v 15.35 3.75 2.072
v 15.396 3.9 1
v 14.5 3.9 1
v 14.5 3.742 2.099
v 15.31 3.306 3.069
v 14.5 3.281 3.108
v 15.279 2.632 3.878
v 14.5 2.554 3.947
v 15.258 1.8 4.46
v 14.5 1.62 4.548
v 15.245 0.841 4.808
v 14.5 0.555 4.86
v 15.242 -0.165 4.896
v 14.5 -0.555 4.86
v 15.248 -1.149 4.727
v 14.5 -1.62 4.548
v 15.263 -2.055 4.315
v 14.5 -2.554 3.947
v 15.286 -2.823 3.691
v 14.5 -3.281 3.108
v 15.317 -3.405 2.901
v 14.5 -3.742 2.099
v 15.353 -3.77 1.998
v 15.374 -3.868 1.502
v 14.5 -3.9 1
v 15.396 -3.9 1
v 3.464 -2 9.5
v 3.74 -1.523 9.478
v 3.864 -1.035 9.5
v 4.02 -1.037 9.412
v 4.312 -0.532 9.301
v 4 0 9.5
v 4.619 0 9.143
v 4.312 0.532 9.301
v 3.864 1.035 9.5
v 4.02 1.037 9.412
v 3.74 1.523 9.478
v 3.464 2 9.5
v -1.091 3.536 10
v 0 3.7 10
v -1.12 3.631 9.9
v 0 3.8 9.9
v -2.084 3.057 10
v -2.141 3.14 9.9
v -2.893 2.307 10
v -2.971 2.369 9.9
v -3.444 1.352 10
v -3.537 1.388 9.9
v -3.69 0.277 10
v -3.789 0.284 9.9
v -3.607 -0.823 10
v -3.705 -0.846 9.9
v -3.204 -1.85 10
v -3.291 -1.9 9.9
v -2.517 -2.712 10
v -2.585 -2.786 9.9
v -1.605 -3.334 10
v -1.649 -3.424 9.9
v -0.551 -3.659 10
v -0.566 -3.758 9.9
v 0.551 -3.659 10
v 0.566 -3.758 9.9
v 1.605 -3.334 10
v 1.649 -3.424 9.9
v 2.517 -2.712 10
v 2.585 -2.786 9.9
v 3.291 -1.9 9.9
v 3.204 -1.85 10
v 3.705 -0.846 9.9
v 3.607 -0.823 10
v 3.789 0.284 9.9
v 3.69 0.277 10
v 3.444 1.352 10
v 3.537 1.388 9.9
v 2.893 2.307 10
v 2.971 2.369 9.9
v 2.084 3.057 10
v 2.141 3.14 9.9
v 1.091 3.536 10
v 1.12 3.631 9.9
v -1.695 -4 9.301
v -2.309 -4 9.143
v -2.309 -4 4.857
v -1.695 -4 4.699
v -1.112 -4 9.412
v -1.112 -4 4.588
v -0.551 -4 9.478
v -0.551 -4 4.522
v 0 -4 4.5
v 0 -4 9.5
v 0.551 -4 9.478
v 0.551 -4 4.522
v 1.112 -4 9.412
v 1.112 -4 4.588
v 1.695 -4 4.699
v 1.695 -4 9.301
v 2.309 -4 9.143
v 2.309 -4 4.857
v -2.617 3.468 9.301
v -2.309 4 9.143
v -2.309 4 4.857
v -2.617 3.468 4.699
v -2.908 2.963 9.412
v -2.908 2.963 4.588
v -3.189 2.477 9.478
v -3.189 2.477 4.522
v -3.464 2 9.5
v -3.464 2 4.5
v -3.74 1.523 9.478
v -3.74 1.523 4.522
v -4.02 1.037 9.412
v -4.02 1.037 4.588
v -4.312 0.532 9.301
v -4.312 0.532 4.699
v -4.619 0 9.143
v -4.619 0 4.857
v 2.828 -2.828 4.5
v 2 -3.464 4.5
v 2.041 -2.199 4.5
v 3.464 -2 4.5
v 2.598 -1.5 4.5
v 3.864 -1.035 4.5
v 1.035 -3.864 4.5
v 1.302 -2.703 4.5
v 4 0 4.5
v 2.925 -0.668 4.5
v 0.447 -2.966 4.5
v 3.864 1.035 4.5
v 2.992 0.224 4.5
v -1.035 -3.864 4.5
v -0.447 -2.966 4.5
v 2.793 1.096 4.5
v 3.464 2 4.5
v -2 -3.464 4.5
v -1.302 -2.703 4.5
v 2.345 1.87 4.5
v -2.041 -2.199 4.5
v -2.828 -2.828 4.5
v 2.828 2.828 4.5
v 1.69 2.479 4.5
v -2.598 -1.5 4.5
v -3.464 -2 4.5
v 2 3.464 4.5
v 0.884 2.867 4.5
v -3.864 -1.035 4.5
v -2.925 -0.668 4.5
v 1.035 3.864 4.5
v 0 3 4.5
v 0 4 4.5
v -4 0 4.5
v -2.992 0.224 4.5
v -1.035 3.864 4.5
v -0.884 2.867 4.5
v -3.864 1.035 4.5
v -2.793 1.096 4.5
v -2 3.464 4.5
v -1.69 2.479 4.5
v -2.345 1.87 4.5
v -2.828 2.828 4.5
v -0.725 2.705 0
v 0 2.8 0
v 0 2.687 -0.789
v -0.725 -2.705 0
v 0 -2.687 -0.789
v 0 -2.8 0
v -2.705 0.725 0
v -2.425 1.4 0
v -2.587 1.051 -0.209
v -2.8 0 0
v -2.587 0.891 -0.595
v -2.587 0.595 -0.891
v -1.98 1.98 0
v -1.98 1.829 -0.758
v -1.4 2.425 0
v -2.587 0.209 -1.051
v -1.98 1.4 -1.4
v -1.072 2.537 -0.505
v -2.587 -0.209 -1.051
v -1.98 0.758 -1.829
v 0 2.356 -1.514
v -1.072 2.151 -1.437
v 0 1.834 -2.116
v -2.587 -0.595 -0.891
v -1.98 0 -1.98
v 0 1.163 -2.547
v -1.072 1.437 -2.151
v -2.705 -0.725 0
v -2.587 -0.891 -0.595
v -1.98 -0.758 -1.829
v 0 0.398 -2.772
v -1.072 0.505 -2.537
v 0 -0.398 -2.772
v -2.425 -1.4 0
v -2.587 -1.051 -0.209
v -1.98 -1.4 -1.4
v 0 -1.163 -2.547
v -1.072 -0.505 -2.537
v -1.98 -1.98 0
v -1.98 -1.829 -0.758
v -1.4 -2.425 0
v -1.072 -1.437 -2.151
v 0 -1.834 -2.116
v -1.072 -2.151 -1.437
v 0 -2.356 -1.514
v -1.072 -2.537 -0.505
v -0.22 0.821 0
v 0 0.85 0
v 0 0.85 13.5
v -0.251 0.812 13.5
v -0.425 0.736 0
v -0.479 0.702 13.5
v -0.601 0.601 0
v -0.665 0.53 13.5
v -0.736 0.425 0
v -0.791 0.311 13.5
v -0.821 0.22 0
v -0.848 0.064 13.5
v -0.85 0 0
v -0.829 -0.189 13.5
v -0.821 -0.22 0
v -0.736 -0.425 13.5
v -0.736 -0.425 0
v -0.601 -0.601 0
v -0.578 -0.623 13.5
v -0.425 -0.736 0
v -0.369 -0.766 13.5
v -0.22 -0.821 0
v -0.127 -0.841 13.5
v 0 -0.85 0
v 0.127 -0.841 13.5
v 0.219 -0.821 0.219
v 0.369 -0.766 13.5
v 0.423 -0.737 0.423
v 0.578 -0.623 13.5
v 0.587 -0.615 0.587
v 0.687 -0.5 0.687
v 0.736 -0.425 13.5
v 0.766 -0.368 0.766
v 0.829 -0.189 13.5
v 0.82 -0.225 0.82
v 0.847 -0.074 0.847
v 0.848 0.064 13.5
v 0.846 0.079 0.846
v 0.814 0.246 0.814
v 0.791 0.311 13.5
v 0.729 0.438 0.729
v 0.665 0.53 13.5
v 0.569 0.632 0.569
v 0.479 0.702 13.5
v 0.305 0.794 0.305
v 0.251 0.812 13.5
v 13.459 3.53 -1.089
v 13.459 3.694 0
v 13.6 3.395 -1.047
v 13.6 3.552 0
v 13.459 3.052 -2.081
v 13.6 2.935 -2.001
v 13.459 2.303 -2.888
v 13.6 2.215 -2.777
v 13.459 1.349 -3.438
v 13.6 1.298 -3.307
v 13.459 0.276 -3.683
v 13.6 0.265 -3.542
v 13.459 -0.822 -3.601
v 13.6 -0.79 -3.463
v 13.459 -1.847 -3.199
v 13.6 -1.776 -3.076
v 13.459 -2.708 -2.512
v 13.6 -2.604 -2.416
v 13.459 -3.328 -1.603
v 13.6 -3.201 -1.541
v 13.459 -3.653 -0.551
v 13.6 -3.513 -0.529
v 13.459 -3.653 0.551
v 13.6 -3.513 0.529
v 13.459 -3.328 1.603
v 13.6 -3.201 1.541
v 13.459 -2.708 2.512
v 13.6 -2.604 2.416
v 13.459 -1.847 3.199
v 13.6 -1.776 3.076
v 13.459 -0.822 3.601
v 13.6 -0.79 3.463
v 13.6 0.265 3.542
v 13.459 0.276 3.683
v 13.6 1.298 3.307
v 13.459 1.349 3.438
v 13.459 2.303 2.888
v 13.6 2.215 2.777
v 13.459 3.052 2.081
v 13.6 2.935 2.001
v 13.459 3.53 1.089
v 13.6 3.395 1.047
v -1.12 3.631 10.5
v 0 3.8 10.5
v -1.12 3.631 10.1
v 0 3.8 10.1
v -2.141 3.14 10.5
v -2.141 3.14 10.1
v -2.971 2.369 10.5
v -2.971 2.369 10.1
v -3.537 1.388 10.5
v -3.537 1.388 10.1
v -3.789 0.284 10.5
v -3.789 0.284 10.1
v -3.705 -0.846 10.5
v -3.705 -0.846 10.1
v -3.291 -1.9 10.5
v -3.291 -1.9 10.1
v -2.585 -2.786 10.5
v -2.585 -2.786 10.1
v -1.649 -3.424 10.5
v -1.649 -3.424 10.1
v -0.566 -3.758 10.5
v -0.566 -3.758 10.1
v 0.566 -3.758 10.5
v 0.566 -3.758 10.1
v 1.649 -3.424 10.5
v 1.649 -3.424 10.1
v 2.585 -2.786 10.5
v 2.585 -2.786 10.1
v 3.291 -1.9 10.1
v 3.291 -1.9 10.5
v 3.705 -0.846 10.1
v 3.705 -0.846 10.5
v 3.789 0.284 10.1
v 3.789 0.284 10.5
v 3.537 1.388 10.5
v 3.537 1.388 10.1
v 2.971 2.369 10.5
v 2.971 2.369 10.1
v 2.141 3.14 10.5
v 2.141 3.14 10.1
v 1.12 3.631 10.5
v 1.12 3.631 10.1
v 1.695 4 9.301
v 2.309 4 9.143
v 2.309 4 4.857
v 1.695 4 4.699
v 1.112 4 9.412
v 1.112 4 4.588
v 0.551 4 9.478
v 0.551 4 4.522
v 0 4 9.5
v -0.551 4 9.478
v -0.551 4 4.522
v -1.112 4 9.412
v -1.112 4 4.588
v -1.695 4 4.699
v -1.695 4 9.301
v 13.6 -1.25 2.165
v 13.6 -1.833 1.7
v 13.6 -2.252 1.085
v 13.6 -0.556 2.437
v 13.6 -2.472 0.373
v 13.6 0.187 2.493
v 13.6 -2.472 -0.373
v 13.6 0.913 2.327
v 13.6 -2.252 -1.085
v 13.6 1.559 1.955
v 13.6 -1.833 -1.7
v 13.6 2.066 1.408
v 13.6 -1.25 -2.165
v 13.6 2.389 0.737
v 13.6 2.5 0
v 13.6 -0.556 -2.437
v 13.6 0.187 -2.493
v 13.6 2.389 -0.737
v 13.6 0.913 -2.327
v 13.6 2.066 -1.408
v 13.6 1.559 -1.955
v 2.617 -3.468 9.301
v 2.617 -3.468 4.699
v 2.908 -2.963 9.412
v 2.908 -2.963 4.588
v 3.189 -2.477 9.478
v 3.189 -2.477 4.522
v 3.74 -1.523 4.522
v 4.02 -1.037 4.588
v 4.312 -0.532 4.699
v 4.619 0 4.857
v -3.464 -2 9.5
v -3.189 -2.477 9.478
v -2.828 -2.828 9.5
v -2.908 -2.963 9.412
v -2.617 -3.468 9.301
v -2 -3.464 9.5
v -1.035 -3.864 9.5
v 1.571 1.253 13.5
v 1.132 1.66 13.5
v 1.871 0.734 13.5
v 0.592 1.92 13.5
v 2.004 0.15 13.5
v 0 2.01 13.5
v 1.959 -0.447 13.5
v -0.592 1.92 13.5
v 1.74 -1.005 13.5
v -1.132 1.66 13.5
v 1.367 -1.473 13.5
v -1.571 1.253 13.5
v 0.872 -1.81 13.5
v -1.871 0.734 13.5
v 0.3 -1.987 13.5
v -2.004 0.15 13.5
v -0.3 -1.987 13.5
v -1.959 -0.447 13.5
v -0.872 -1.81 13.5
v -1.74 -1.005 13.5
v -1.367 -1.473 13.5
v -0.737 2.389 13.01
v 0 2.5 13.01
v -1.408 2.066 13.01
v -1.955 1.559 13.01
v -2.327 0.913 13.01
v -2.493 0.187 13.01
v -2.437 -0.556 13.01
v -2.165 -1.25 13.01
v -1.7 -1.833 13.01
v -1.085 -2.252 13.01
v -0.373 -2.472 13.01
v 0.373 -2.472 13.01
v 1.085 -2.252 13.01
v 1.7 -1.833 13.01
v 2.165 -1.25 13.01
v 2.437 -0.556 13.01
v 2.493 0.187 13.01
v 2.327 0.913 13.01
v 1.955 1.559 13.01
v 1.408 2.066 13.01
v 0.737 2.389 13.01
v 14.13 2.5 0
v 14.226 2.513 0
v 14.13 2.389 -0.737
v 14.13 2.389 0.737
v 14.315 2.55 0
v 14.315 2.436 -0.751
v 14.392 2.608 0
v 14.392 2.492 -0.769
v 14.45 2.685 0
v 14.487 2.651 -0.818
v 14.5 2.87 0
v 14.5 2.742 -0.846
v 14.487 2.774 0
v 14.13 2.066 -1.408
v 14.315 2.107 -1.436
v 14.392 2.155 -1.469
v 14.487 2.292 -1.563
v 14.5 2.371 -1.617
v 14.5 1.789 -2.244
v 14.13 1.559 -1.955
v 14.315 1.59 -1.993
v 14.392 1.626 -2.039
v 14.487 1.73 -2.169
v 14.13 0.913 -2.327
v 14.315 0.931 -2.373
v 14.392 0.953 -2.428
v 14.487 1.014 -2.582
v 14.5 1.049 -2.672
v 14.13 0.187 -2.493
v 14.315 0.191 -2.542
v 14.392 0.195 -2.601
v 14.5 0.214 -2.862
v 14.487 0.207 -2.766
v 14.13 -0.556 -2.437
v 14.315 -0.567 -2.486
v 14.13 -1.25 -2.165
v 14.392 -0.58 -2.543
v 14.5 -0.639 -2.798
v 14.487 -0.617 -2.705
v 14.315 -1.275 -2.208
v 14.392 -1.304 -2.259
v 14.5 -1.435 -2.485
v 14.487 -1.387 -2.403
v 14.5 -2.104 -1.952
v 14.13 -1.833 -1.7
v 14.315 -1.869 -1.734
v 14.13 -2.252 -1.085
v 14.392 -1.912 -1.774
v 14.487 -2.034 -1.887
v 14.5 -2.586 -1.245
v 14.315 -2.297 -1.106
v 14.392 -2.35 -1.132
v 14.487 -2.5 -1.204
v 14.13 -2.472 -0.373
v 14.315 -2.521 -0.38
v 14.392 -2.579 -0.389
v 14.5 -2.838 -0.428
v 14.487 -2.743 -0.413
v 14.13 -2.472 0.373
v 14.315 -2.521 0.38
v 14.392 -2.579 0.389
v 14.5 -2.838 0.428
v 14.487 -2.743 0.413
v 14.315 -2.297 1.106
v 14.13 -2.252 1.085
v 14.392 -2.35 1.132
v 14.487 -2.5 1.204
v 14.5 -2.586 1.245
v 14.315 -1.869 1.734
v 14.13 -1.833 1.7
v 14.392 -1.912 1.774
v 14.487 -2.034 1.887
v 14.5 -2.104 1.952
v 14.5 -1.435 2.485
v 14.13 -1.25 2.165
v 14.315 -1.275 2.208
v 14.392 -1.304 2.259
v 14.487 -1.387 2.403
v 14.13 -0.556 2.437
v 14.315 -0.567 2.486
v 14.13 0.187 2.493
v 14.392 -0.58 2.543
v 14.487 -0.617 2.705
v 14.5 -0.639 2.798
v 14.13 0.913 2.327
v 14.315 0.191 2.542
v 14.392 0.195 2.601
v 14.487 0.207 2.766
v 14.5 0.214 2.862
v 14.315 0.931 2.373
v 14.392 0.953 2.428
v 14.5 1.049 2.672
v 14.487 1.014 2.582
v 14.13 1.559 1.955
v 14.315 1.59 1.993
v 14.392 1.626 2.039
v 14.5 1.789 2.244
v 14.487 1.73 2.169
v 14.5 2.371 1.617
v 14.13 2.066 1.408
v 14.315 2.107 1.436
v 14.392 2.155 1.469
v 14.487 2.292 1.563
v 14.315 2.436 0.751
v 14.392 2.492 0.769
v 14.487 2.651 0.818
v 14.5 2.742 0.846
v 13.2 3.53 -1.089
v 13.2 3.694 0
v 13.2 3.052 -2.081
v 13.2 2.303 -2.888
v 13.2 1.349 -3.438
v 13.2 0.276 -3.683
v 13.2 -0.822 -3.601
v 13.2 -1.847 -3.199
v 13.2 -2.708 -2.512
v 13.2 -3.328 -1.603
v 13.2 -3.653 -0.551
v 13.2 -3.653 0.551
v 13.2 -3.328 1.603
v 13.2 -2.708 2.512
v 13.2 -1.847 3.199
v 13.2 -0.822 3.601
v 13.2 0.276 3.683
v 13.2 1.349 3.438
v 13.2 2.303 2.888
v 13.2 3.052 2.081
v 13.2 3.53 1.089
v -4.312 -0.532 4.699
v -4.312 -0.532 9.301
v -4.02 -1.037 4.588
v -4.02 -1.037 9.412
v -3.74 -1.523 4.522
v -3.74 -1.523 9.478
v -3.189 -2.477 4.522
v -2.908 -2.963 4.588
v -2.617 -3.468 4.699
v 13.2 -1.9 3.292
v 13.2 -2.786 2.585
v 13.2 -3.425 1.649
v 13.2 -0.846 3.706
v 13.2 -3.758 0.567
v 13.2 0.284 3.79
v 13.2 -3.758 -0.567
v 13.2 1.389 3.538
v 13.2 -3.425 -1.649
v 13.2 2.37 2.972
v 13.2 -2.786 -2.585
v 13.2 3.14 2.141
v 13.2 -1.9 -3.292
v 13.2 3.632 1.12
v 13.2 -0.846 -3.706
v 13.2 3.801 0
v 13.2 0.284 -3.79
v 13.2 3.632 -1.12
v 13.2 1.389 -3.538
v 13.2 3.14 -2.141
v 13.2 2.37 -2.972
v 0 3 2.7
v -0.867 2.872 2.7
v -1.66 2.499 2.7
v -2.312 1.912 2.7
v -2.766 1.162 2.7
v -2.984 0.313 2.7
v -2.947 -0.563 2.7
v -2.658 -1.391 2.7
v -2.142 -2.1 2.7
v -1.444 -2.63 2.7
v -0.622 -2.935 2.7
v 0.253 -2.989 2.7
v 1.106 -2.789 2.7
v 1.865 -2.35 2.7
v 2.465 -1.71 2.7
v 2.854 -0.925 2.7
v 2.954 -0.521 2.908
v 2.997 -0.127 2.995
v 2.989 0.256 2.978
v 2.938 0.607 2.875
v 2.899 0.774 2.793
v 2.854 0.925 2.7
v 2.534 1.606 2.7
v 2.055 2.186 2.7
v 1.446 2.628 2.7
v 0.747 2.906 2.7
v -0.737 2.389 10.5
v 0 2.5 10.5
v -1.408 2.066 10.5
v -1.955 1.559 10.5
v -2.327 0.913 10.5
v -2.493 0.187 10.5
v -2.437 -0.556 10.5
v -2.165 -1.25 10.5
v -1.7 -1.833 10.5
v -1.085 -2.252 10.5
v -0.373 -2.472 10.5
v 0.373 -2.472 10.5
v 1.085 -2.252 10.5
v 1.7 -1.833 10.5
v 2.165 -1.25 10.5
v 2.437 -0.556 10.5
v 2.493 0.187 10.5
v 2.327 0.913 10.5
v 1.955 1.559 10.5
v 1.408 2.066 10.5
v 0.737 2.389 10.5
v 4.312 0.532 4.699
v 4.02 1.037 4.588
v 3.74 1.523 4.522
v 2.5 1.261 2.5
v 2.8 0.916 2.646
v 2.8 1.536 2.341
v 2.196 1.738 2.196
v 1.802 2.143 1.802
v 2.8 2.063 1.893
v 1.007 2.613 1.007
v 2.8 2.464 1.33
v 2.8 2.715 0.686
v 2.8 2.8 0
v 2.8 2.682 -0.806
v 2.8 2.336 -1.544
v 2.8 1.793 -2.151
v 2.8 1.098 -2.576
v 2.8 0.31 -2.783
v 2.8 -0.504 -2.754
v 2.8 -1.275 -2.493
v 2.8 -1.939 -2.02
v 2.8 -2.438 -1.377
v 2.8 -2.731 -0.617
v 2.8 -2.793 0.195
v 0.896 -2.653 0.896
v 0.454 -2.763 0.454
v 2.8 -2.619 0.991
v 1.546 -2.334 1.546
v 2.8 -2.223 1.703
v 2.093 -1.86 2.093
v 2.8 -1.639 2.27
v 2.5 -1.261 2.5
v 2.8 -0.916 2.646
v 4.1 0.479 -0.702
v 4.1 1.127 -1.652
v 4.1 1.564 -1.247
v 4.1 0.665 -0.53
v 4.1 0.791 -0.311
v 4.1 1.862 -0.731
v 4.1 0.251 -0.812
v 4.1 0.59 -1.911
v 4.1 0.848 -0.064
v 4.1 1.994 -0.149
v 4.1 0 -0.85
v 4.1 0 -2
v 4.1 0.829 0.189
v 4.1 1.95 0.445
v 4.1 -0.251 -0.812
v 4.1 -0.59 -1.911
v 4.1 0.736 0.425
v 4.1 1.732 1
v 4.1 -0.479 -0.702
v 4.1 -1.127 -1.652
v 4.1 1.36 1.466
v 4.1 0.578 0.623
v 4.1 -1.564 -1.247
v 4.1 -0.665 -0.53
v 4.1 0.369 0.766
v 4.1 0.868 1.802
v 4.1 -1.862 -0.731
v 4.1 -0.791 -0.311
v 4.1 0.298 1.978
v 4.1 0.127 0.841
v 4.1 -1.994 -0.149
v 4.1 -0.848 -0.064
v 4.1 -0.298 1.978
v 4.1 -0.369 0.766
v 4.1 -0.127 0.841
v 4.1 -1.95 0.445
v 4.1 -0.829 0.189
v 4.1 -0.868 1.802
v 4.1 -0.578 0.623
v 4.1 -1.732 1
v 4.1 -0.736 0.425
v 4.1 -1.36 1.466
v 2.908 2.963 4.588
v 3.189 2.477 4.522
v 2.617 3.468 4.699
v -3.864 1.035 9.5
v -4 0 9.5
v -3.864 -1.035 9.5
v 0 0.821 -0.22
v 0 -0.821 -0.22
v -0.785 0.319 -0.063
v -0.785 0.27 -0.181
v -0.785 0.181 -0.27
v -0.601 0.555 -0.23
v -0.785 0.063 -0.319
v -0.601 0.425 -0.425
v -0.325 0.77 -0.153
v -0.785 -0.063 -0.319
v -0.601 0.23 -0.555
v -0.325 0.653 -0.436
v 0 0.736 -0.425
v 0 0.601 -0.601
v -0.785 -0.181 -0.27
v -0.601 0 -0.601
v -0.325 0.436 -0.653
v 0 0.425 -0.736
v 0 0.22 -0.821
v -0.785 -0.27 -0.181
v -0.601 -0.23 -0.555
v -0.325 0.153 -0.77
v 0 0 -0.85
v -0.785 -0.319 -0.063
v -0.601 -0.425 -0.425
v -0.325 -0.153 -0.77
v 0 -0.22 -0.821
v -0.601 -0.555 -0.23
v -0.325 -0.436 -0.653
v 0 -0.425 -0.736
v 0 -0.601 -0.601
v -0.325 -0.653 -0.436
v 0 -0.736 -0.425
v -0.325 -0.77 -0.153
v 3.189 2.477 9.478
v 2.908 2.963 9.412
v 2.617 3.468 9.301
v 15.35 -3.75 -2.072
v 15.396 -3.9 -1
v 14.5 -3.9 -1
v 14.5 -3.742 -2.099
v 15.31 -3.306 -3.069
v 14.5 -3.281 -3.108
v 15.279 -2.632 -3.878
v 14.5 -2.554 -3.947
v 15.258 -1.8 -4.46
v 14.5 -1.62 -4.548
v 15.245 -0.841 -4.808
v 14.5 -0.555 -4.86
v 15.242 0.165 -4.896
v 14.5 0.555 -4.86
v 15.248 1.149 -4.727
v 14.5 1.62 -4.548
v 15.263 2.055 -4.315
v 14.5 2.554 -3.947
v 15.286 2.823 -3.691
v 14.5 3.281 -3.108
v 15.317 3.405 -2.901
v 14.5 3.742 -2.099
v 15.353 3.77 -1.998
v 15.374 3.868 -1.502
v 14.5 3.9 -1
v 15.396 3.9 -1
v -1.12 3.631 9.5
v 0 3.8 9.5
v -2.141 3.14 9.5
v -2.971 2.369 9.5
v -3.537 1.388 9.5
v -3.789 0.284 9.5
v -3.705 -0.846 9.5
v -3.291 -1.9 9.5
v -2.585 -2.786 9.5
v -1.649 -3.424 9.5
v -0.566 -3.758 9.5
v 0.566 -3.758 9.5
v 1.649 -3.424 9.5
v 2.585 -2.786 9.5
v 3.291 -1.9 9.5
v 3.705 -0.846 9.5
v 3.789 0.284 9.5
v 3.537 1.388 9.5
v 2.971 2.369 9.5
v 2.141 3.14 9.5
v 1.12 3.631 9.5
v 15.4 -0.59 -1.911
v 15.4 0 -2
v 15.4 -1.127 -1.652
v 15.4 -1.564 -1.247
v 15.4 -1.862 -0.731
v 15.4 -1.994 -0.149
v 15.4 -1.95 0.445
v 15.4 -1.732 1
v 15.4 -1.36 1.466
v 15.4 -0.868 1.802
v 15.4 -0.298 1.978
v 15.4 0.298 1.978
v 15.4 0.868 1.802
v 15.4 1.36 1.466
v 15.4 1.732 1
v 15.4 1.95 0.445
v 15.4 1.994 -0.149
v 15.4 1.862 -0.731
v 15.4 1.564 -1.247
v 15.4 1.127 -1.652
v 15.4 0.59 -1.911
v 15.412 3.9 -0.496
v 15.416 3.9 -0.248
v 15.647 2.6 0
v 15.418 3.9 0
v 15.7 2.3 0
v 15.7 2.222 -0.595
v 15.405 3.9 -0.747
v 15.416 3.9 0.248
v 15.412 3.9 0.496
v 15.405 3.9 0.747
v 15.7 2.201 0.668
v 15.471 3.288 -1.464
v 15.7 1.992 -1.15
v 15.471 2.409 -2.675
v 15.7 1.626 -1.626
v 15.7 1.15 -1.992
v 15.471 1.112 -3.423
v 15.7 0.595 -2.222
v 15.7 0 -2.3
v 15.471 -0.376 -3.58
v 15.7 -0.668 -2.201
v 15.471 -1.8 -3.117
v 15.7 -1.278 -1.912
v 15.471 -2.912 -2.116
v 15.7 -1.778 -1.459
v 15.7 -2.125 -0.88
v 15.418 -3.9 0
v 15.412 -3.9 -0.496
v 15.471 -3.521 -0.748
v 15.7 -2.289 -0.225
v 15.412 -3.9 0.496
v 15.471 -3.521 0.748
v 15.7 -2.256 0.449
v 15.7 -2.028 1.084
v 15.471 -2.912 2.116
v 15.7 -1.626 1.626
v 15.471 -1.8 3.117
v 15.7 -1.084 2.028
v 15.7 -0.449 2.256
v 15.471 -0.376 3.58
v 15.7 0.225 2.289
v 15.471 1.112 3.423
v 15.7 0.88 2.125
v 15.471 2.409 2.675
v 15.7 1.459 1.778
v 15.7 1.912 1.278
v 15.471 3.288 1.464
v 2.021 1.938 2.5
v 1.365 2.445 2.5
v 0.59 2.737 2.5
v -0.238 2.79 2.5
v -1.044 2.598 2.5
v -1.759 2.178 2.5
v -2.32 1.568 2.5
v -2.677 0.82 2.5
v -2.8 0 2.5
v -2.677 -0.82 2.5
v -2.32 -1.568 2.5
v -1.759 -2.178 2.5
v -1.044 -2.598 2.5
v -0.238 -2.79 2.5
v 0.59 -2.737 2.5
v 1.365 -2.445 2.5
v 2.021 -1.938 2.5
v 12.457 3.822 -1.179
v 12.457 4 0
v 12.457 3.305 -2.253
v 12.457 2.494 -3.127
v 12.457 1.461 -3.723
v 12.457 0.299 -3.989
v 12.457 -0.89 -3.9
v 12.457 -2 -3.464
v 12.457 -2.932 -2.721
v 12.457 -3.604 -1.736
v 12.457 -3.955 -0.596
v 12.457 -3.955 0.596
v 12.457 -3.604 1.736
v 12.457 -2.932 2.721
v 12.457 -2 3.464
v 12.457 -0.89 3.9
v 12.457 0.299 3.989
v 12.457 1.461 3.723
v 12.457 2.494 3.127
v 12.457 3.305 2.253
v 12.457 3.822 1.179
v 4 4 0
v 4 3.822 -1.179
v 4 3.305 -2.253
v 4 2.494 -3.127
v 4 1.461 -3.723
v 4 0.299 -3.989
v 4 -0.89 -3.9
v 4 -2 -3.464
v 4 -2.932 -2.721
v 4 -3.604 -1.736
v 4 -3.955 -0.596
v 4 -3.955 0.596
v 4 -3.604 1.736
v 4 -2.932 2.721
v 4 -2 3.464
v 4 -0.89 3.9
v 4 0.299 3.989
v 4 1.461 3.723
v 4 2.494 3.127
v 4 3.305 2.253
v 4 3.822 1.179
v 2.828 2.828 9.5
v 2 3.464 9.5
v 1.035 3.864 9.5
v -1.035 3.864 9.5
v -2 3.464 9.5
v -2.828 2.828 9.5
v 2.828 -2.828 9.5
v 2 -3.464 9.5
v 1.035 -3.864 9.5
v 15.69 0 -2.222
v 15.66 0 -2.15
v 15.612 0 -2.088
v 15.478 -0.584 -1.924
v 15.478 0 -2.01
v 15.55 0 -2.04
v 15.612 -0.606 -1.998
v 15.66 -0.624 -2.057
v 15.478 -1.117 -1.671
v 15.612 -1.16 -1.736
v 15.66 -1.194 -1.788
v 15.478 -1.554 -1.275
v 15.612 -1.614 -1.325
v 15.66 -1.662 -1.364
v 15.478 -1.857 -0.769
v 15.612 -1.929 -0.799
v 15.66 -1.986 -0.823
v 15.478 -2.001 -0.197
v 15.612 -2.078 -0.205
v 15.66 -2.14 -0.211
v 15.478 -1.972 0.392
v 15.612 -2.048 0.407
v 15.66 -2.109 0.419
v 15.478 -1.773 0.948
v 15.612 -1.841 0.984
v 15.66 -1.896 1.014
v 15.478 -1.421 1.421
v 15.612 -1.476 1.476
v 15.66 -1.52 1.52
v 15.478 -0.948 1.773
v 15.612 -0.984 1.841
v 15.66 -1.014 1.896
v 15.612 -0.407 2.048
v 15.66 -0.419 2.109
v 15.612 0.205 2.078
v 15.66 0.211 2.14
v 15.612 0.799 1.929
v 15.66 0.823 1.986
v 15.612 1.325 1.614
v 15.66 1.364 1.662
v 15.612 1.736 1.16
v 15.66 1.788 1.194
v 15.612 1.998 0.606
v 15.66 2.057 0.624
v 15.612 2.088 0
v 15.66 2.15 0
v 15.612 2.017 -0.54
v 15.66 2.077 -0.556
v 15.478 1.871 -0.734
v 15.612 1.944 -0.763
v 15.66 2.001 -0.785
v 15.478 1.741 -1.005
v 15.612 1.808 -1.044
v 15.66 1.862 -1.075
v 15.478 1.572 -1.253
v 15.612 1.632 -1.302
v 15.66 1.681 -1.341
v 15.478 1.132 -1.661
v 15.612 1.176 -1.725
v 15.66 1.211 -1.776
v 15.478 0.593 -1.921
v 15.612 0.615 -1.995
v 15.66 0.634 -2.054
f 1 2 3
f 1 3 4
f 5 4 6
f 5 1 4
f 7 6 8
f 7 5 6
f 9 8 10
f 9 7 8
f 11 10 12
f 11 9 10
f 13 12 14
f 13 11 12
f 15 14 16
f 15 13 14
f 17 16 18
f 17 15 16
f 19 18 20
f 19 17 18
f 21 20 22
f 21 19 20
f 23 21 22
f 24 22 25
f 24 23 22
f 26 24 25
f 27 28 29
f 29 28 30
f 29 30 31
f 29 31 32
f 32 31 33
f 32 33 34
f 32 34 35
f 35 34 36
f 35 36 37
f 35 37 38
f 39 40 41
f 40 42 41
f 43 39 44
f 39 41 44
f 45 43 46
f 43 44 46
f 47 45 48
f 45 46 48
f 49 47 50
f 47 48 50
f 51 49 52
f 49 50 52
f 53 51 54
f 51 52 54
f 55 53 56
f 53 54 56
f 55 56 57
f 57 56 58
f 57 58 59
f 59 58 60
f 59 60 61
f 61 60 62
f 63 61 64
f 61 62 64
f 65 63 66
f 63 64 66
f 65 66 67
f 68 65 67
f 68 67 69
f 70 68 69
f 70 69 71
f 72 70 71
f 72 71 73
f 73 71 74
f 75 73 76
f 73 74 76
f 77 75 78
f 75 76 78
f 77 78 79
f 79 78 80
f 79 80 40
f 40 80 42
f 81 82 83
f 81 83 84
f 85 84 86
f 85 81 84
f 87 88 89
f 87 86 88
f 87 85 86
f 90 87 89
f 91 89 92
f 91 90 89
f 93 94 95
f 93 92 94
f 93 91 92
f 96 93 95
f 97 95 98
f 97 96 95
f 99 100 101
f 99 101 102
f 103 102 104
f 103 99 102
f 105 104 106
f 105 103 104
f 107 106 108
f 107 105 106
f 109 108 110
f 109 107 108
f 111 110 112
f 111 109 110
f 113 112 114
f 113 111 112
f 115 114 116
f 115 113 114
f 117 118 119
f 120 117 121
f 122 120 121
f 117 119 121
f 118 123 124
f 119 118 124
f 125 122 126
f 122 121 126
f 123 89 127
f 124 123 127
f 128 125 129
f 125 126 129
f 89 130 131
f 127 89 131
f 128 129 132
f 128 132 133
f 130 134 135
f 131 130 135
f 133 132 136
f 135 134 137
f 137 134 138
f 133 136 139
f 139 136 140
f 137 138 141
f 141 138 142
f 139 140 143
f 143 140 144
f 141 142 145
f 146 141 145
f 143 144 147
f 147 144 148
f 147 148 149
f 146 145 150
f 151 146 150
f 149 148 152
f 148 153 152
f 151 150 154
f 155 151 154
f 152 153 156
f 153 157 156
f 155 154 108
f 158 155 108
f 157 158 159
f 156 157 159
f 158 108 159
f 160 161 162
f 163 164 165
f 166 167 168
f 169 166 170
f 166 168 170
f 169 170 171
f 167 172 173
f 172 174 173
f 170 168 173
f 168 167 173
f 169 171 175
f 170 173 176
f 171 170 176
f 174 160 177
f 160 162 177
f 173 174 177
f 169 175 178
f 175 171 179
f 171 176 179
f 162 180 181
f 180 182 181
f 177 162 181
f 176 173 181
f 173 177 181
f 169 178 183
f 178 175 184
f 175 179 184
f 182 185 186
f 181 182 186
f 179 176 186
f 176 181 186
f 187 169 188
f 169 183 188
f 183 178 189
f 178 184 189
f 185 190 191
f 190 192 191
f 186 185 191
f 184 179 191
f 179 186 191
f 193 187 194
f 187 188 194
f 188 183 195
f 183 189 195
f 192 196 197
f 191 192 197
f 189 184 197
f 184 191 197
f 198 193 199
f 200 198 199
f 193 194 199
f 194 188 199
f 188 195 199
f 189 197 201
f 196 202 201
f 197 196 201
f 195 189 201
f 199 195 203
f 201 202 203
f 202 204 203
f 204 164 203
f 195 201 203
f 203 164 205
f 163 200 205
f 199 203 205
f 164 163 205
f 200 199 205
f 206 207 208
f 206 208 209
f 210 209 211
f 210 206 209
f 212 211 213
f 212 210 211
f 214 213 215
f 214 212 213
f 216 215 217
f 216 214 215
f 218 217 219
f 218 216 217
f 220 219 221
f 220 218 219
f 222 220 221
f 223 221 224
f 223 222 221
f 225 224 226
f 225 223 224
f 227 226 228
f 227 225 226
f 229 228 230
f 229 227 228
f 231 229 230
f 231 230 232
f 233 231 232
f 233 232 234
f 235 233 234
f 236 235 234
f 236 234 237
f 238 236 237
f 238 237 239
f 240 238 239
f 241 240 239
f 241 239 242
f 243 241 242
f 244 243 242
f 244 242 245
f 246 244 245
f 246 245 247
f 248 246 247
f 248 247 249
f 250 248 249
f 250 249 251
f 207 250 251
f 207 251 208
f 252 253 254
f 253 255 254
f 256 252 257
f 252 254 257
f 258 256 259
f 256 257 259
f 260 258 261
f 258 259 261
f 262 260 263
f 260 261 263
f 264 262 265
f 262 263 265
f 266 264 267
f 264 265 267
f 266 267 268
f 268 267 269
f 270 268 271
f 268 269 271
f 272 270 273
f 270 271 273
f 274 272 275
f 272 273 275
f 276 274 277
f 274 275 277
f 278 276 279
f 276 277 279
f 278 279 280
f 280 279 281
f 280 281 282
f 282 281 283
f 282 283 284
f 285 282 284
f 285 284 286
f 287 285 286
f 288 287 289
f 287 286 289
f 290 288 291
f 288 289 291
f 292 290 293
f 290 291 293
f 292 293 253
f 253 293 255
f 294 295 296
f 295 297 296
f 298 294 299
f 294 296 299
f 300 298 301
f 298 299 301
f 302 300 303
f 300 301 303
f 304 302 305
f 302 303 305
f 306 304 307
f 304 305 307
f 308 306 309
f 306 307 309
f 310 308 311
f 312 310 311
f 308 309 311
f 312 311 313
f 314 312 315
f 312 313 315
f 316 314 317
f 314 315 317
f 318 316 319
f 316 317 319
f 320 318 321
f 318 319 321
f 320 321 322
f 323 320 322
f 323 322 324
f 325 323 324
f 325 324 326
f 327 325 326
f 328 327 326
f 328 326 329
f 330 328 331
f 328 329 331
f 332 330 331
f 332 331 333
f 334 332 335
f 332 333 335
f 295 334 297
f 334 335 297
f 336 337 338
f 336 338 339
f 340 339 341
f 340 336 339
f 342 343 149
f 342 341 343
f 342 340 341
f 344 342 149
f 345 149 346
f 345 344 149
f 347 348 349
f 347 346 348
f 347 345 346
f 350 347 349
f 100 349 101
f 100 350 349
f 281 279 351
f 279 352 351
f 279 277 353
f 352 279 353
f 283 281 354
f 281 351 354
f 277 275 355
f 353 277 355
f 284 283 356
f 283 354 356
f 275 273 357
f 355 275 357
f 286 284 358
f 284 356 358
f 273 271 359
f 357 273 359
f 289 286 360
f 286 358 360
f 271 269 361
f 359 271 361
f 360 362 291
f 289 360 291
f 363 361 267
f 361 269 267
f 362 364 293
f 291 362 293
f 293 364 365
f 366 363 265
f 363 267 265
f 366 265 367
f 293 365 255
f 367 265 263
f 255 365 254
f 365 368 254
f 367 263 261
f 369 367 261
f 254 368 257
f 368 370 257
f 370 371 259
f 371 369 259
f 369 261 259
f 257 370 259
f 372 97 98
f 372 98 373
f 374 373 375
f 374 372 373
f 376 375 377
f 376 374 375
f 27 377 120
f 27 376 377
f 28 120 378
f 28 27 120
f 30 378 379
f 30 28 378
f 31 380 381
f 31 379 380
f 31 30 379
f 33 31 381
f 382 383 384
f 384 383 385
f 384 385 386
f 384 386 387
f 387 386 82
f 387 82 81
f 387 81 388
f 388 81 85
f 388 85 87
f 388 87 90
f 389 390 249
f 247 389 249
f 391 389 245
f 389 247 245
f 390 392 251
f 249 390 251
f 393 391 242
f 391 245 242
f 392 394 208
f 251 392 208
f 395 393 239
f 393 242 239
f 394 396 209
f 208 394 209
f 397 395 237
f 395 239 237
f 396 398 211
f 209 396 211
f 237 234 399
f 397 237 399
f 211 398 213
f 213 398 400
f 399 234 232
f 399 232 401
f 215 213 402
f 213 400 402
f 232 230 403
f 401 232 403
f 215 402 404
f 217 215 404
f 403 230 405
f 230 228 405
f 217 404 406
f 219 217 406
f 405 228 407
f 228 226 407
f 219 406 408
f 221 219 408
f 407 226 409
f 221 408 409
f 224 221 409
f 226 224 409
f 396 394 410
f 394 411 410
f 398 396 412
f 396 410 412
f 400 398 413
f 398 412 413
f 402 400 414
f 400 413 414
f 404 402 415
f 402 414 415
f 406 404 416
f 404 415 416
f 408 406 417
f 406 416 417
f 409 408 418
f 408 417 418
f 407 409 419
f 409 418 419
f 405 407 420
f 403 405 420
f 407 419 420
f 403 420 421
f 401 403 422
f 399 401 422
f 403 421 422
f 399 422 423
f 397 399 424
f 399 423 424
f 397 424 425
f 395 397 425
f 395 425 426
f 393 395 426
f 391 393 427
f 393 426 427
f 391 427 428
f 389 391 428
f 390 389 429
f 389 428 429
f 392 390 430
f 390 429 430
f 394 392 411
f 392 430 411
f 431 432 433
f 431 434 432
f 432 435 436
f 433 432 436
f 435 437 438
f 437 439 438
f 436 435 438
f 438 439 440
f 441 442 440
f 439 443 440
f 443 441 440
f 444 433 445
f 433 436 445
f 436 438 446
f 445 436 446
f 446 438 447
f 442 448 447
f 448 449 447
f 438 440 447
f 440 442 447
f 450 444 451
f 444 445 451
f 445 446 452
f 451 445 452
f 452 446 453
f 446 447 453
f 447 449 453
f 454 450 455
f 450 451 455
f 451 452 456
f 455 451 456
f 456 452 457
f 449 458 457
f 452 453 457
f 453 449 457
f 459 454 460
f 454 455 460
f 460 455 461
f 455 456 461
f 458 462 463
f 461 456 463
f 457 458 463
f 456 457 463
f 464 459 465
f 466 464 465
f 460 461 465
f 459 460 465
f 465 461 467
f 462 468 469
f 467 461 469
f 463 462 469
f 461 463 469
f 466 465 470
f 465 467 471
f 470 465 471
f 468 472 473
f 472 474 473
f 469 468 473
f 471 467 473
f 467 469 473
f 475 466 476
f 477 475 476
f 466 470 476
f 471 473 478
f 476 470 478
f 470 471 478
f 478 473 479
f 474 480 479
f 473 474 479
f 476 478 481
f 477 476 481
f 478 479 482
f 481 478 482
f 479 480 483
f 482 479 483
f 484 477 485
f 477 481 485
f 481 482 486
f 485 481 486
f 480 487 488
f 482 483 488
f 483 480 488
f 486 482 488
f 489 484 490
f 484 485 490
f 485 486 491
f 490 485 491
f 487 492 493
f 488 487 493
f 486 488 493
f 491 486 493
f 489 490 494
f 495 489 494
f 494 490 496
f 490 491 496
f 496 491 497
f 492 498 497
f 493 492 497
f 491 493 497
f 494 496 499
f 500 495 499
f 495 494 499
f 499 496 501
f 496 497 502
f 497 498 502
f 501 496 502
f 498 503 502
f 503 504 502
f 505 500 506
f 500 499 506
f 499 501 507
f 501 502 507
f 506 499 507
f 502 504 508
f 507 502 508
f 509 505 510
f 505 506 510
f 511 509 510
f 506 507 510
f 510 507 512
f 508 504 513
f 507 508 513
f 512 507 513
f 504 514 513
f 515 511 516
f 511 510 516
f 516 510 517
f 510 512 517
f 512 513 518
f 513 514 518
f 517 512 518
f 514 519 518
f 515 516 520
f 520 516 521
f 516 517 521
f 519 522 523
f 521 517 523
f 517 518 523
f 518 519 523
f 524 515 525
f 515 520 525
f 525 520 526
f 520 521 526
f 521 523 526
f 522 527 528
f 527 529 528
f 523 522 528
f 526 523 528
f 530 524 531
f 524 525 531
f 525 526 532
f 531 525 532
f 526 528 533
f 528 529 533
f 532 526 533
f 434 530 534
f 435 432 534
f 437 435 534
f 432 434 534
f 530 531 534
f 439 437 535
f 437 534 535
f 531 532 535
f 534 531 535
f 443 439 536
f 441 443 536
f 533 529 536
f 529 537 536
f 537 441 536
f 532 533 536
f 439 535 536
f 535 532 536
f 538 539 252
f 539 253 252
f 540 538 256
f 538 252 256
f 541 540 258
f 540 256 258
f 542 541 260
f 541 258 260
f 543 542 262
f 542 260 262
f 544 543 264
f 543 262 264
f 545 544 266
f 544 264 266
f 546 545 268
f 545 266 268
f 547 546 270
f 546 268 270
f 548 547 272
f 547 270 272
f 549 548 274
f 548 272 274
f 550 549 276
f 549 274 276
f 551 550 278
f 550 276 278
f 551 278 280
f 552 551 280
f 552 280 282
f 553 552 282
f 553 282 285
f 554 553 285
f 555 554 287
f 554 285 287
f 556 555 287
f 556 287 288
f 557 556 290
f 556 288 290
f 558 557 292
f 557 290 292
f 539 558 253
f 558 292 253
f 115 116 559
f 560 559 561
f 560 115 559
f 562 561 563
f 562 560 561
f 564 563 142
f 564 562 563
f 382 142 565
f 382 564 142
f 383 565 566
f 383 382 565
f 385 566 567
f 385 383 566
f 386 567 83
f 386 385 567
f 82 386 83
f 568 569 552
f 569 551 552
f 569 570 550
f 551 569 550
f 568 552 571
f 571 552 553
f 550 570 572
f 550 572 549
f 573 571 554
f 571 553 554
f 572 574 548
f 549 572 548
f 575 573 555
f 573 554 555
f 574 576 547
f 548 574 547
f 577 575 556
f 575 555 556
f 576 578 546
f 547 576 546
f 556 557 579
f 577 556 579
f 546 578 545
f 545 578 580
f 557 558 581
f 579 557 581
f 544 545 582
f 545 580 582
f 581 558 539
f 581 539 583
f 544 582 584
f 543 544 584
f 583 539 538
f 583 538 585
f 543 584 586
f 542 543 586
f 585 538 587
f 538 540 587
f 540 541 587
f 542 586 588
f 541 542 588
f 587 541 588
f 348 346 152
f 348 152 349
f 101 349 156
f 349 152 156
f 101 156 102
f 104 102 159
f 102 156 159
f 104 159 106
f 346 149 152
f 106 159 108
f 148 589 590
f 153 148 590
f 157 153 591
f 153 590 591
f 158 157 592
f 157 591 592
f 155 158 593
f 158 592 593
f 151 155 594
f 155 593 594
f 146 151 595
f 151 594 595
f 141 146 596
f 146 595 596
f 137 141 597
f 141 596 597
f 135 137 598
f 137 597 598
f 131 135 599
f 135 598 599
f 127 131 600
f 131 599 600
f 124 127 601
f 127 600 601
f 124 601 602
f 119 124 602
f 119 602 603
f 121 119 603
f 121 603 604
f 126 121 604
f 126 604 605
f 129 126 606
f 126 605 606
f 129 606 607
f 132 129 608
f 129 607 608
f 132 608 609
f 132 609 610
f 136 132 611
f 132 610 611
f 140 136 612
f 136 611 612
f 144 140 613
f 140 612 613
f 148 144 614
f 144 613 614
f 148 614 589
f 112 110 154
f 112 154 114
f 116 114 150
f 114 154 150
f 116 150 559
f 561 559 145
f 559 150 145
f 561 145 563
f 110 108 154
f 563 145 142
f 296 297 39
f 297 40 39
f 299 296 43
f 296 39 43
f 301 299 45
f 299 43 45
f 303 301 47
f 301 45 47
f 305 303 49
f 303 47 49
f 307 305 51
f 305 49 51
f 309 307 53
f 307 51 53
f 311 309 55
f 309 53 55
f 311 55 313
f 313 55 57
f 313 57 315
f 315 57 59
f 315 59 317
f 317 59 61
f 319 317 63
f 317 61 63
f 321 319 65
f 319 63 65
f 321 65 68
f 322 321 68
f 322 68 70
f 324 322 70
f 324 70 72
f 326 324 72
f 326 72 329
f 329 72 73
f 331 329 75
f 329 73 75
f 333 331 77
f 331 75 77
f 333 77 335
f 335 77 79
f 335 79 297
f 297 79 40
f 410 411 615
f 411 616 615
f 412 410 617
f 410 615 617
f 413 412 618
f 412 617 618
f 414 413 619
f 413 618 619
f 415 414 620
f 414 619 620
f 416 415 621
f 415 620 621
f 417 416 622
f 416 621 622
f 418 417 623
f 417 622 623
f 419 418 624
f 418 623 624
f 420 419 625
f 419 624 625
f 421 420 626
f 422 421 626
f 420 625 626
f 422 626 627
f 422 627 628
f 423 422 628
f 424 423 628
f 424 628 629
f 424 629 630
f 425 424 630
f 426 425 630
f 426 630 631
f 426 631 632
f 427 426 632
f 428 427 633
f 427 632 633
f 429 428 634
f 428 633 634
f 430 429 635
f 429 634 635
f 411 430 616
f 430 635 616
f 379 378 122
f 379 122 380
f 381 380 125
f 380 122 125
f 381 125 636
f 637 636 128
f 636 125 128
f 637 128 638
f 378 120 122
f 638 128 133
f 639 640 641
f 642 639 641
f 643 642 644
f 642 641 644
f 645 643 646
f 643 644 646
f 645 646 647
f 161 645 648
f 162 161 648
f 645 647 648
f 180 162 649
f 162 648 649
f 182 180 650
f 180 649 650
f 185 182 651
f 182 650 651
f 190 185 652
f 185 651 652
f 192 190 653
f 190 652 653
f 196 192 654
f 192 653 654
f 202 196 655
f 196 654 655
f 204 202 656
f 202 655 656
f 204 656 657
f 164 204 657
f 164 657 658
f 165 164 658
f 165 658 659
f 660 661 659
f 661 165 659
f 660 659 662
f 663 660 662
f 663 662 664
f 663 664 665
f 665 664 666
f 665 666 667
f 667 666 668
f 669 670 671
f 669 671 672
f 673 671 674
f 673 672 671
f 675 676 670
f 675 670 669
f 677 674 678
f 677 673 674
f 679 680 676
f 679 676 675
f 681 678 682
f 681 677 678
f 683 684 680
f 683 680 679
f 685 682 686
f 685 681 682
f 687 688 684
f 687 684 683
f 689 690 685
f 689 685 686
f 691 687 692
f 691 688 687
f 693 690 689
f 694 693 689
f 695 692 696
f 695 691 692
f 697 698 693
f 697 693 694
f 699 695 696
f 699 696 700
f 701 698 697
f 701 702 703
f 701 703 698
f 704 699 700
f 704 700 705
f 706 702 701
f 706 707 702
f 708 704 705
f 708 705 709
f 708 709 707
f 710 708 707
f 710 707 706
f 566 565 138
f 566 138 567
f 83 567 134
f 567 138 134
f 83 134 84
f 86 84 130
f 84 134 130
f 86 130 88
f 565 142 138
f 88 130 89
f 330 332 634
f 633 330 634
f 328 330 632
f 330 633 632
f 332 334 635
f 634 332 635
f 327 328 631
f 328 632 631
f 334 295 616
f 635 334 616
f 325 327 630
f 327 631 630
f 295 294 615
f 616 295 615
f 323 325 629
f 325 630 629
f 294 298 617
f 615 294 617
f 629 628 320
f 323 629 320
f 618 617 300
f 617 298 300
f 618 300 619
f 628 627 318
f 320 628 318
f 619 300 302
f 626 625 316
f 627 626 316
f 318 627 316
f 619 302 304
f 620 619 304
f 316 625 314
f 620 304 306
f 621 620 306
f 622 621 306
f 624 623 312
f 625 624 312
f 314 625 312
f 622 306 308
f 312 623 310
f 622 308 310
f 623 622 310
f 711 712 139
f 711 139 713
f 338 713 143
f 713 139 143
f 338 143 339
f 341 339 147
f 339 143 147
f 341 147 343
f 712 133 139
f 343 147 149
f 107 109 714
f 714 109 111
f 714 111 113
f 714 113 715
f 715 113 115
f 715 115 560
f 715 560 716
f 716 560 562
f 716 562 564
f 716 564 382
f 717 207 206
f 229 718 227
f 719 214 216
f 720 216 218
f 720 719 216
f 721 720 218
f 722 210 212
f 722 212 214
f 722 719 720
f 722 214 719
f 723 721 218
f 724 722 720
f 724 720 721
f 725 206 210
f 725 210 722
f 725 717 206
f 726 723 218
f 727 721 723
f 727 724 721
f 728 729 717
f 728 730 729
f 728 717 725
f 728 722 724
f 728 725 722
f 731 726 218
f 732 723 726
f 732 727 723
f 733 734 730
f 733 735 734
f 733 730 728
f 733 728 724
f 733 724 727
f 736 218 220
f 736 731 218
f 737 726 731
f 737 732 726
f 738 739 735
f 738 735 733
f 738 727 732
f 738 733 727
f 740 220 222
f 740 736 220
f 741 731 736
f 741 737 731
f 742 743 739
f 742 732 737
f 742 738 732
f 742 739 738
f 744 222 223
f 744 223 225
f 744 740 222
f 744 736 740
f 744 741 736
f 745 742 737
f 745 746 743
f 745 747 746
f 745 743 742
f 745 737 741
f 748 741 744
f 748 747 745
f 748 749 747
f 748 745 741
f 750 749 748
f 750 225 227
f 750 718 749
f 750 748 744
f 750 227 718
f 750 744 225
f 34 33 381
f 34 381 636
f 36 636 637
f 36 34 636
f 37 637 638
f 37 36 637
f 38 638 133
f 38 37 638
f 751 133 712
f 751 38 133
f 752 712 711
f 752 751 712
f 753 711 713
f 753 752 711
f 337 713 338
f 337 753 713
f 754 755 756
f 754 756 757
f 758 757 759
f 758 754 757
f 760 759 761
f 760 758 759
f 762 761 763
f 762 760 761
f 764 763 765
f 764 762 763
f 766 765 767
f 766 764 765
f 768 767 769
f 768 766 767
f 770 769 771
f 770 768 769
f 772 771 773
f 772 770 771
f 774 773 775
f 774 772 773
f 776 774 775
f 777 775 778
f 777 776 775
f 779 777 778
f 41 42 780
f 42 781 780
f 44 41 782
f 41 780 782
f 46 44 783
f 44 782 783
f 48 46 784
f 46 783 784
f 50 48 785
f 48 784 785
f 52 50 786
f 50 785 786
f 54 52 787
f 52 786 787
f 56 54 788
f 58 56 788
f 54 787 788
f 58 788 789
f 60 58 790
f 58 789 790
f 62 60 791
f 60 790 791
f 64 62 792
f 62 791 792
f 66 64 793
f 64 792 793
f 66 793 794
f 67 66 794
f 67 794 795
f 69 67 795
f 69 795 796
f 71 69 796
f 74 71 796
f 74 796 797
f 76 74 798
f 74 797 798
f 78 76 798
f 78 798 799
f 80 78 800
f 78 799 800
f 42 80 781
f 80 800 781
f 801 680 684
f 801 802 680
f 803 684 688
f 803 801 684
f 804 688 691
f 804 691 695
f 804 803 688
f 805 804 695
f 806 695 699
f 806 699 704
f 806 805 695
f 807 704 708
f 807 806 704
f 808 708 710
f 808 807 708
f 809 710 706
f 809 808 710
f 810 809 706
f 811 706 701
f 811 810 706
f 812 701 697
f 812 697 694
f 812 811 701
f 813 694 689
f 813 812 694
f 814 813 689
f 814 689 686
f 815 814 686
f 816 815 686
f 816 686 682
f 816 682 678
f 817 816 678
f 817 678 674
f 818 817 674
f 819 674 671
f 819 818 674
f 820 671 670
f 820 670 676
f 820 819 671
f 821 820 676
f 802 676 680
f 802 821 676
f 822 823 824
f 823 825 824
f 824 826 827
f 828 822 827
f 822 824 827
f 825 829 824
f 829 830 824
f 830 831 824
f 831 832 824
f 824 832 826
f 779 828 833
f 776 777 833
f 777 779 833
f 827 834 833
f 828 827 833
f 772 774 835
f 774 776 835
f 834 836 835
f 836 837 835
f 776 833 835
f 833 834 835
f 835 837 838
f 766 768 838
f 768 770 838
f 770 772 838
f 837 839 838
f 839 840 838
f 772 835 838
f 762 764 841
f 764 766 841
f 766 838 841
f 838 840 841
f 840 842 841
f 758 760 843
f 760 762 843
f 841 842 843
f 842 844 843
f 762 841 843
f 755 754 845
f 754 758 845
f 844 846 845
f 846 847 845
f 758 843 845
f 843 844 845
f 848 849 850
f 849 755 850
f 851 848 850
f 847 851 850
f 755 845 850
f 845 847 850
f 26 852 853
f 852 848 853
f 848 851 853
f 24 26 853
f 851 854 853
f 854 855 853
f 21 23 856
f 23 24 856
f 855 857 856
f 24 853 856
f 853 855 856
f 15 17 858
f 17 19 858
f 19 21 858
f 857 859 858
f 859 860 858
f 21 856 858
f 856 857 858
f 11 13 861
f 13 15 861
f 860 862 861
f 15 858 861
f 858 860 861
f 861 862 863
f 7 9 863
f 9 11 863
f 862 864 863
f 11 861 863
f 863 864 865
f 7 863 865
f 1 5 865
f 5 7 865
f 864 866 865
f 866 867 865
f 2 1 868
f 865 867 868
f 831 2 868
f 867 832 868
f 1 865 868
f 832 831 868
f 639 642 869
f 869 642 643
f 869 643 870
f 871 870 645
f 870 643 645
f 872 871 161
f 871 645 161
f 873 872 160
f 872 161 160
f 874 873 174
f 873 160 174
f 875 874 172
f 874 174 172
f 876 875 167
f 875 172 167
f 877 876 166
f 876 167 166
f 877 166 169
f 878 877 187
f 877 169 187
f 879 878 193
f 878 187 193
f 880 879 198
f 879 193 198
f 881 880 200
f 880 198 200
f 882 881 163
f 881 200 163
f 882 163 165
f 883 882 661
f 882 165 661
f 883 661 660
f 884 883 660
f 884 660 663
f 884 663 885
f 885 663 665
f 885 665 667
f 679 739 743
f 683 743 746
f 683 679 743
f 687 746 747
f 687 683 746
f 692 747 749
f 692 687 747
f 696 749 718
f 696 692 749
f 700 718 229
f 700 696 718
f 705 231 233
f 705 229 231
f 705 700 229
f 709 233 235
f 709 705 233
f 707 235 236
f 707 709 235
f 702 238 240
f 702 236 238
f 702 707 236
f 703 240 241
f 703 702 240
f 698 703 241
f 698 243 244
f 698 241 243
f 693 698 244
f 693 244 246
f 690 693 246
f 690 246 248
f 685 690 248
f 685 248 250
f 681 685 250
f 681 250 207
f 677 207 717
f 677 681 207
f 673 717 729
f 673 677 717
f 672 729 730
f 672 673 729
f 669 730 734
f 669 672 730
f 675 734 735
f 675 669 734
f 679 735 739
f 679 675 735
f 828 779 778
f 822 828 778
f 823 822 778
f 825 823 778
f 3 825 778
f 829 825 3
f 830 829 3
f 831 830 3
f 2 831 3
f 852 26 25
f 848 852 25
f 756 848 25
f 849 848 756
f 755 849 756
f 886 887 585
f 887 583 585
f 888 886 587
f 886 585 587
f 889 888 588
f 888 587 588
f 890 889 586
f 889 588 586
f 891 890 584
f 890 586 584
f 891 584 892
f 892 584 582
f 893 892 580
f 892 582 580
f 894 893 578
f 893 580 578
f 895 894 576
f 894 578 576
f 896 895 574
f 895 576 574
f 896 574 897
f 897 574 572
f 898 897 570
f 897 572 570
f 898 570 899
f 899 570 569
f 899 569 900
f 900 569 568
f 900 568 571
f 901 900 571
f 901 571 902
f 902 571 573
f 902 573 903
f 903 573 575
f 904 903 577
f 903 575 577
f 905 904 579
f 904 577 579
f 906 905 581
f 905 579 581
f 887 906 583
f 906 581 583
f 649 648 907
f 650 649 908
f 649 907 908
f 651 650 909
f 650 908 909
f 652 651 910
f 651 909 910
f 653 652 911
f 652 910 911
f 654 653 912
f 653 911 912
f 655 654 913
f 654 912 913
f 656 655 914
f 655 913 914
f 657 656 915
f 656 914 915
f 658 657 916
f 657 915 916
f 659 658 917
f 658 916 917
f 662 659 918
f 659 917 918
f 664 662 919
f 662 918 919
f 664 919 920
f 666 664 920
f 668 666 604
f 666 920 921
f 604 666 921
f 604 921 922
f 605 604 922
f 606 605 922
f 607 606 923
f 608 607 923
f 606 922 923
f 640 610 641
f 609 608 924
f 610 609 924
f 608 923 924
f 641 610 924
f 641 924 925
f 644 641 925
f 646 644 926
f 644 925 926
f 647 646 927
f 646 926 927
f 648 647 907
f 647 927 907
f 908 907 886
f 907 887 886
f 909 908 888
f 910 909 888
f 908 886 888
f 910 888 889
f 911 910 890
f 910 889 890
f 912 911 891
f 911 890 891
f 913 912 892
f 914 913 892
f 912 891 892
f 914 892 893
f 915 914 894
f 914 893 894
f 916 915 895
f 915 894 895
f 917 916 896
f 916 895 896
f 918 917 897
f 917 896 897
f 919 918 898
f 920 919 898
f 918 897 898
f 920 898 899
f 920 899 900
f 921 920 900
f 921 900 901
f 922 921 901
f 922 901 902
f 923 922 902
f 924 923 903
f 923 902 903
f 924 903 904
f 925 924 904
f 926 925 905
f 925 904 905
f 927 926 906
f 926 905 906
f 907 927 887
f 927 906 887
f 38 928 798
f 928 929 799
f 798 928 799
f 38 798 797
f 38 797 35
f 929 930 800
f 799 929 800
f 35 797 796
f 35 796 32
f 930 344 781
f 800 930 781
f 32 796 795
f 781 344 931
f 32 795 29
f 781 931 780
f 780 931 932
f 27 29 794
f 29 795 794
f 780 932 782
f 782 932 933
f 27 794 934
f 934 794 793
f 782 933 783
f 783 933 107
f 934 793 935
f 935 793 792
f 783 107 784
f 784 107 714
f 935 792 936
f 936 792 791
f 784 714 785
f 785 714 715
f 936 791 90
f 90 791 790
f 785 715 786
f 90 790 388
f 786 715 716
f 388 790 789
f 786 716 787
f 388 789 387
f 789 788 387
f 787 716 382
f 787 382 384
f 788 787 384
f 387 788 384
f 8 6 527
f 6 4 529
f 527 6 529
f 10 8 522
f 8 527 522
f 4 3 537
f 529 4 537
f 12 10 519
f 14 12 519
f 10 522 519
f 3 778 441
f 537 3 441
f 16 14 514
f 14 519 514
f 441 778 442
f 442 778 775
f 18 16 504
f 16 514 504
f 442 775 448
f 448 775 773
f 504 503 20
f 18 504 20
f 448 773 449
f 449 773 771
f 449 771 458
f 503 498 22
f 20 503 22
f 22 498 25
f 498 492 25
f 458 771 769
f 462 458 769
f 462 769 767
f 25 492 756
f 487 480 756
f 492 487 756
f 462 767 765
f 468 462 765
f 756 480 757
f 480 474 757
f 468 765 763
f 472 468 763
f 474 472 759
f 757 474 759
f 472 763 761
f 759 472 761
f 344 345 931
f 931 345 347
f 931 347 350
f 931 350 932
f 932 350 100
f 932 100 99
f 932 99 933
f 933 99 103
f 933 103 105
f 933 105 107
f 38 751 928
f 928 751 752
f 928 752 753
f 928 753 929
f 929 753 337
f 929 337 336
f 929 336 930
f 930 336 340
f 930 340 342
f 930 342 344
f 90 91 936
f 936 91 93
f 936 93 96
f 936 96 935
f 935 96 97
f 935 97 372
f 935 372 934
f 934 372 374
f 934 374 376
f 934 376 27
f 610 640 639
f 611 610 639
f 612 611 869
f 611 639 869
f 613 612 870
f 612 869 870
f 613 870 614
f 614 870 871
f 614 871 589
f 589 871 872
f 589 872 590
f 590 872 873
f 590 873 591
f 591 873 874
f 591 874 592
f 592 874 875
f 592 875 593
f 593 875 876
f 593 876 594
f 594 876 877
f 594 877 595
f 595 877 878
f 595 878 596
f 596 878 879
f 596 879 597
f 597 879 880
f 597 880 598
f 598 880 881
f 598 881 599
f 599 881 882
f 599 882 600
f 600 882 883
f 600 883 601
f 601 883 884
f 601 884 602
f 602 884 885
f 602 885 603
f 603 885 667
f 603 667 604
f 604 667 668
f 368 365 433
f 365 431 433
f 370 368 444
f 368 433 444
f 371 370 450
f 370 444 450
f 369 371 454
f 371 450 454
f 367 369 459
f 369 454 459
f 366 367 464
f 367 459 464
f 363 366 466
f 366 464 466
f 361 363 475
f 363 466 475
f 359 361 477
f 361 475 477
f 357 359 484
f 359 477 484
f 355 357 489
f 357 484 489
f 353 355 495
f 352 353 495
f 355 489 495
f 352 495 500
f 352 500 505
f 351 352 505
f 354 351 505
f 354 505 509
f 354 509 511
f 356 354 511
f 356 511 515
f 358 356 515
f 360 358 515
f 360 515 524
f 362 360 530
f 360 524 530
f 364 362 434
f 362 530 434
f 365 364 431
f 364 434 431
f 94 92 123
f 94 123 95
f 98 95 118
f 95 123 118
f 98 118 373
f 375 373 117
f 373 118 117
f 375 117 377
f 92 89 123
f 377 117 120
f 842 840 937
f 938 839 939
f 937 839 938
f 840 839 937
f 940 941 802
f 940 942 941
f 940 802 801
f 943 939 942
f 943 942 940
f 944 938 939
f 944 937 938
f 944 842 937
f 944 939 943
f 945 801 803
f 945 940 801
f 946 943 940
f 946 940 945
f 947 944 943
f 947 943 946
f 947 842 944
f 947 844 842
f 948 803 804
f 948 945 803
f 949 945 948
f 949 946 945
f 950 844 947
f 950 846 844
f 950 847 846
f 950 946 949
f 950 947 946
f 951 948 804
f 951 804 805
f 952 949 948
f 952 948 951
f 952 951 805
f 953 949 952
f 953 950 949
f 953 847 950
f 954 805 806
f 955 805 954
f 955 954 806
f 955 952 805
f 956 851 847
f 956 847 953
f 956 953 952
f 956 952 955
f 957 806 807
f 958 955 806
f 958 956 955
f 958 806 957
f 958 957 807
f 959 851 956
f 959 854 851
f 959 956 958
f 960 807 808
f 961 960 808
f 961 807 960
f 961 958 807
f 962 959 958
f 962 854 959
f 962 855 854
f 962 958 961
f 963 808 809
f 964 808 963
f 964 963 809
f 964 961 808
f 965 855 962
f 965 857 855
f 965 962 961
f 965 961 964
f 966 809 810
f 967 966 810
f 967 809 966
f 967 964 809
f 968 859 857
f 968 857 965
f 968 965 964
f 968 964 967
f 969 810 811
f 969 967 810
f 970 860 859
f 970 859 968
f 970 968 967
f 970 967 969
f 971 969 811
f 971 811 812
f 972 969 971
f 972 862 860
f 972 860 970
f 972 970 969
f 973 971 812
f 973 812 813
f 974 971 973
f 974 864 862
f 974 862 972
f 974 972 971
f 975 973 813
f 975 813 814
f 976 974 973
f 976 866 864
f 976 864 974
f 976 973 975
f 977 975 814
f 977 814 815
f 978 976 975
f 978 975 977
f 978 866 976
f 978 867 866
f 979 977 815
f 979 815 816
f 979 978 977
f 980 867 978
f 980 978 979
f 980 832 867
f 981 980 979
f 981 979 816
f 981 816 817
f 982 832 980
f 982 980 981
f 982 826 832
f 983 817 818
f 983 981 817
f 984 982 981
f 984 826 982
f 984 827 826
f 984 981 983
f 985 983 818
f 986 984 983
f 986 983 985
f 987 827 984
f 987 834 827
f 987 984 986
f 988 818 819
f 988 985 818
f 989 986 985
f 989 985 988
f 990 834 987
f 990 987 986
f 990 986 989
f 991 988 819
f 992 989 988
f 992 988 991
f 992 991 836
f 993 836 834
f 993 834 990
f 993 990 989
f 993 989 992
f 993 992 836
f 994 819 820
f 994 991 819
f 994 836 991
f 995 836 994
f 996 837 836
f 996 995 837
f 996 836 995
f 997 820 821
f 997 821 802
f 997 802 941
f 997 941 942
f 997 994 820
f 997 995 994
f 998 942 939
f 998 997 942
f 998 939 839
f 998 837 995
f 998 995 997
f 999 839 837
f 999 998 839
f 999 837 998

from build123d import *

# Parameters (mm, degrees)
CUT_EXTRUDE1_DEPTH = 1.2
SKETCH6_W          = 13.5
SKETCH6_H          = 0.85
SKETCH7_W          = 16
SKETCH7_H          = 16
CUT_EXTRUDE2_DEPTH = 6.055555556


with BuildPart() as part:
    # Sketch1 → Revolve1 (revolve)
    with BuildSketch(Plane.XY):
        with BuildLine():
            Line((0, 2.8), (2.8, 2.8))
            Line((2.8, 2.8), (4, 4))
            Line((4, 4), (12.457142857, 4))
            Line((12.457142857, 4), (13.2, 3.800952028))
            Line((13.2, 3.800952028), (13.2, 3.693772352))
            Line((13.2, 3.693772352), (13.458578644, 3.693772352))
            Line((13.458578644, 3.693772352), (13.6, 3.552350995))
            Line((13.6, 3.552350995), (13.6, 2.5))
            Line((13.6, 2.5), (14.13, 2.5))
            ThreePointArc((14.13, 2.5), (14.391629509, 2.608370491), (14.5, 2.87))
            Line((14.5, 2.87), (14.5, 5.9))
            Line((14.5, 5.9), (14.897402943, 5.9))
            ThreePointArc((14.897402943, 5.9), (15.025960465, 5.853208889), (15.094364494, 5.734729636))
            Line((15.094364494, 5.734729636), (15.7, 2.3))
            Line((15.7, 2.3), (15.7, 0))
            Line((15.7, 0), (-2.8, 0))
            ThreePointArc((-2.8, 0), (-1.979898987, 1.979898987), (0, 2.8))
        make_face()
    revolve(axis=Axis((15.7, 0, 0), (-1, 0, 0)))

    # Sketch2 → Revolve2 (revolve)
    with BuildSketch(Plane(origin=(0, 0, 0), x_dir=(0, 0, -1), z_dir=(1, 0, 0))):
        Polygon((-10.5, 0), (-10.5, 3.8), (-10.1, 3.8), (-10, 3.7), (-9.9, 3.8), (-9.5, 3.8), (-9.5, 4), (-9.130495828, 4.64), (-4.869504172, 4.64), (-4.5, 4), (-4.5, 3), (-2.7, 3), (-2.5, 2.8), (0, 2.8), (0, 0), align=None)
    revolve(axis=Axis((0, 0, 0), (0, 0, 1)))

    # Sketch3 → Revolve3 (revolve)
    with BuildSketch(Plane(origin=(0, 0, 0), x_dir=(0, 0, -1), z_dir=(1, 0, 0))):
        Polygon((-13.5, 0), (-13.5, 2.0095), (-13.0095, 2.5), (-10.5, 2.5), (-10.5, 0), align=None)
    revolve(axis=Axis((0, 0, 10.5), (0, 0, 1)))

    # Sketch4 → Cut-Extrude1 (cut)
    with BuildSketch(Plane(origin=(15.7, 0, 0), x_dir=(0, 0, -1), z_dir=(1, 0, 0))):
        Polygon((-9.8, -5.658032638), (0, -11.316065276), (9.8, -5.658032638), (9.8, 5.658032638), (0, 11.316065276), (-9.8, 5.658032638), align=None)
        with BuildLine():
            Line((-1, -3.9), (1, -3.9))
            ThreePointArc((1, -3.9), (4.9, 0), (1, 3.9))
            Line((1, 3.9), (-1, 3.9))
            ThreePointArc((-1, 3.9), (-4.9, 0), (-1, -3.9))
        make_face(mode=Mode.SUBTRACT)
    extrude(amount=-CUT_EXTRUDE1_DEPTH, mode=Mode.SUBTRACT)

    # Sketch6 → Cut-Revolve1 (revolve, cut)
    with BuildSketch(Plane(origin=(0, 0, 0), x_dir=(0, 0, -1), z_dir=(1, 0, 0))):
        with Locations((-6.75, 0.425)):
            Rectangle(SKETCH6_W, SKETCH6_H)
    revolve(axis=Axis((0, 0, 0), (0, 0, 1)), mode=Mode.SUBTRACT)

    # Sketch5 → Cut-Revolve2 (revolve, cut)
    with BuildSketch(Plane(origin=(0, 0, 0), x_dir=(1, 0, 0), z_dir=(0, 1, 0))):
        with BuildLine():
            Line((0, 0.85), (4.1, 0.85))
            Line((4.1, 0.85), (4.1, 2))
            Line((4.1, 2), (15.4, 2))
            ThreePointArc((15.4, 2), (15.612132034, 2.087867966), (15.7, 2.3))
            Line((15.7, 2.3), (15.7, 0))
            Line((15.7, 0), (-0.85, 0))
            ThreePointArc((-0.85, 0), (-0.601040764, 0.601040764), (0, 0.85))
        make_face()
    revolve(axis=Axis((15.7, 0, 0), (-1, 0, 0)), mode=Mode.SUBTRACT)

    # Sketch7 → Cut-Extrude2 (cut)
    with BuildSketch(Plane.XY.offset(10.5)):
        Rectangle(SKETCH7_W, SKETCH7_H)
        Polygon((-4.618802154, 0), (-2.309401077, -4), (2.309401077, -4), (4.618802154, 0), (2.309401077, 4), (-2.309401077, 4), align=None, mode=Mode.SUBTRACT)
    extrude(amount=-CUT_EXTRUDE2_DEPTH, mode=Mode.SUBTRACT)


solid = part.part
